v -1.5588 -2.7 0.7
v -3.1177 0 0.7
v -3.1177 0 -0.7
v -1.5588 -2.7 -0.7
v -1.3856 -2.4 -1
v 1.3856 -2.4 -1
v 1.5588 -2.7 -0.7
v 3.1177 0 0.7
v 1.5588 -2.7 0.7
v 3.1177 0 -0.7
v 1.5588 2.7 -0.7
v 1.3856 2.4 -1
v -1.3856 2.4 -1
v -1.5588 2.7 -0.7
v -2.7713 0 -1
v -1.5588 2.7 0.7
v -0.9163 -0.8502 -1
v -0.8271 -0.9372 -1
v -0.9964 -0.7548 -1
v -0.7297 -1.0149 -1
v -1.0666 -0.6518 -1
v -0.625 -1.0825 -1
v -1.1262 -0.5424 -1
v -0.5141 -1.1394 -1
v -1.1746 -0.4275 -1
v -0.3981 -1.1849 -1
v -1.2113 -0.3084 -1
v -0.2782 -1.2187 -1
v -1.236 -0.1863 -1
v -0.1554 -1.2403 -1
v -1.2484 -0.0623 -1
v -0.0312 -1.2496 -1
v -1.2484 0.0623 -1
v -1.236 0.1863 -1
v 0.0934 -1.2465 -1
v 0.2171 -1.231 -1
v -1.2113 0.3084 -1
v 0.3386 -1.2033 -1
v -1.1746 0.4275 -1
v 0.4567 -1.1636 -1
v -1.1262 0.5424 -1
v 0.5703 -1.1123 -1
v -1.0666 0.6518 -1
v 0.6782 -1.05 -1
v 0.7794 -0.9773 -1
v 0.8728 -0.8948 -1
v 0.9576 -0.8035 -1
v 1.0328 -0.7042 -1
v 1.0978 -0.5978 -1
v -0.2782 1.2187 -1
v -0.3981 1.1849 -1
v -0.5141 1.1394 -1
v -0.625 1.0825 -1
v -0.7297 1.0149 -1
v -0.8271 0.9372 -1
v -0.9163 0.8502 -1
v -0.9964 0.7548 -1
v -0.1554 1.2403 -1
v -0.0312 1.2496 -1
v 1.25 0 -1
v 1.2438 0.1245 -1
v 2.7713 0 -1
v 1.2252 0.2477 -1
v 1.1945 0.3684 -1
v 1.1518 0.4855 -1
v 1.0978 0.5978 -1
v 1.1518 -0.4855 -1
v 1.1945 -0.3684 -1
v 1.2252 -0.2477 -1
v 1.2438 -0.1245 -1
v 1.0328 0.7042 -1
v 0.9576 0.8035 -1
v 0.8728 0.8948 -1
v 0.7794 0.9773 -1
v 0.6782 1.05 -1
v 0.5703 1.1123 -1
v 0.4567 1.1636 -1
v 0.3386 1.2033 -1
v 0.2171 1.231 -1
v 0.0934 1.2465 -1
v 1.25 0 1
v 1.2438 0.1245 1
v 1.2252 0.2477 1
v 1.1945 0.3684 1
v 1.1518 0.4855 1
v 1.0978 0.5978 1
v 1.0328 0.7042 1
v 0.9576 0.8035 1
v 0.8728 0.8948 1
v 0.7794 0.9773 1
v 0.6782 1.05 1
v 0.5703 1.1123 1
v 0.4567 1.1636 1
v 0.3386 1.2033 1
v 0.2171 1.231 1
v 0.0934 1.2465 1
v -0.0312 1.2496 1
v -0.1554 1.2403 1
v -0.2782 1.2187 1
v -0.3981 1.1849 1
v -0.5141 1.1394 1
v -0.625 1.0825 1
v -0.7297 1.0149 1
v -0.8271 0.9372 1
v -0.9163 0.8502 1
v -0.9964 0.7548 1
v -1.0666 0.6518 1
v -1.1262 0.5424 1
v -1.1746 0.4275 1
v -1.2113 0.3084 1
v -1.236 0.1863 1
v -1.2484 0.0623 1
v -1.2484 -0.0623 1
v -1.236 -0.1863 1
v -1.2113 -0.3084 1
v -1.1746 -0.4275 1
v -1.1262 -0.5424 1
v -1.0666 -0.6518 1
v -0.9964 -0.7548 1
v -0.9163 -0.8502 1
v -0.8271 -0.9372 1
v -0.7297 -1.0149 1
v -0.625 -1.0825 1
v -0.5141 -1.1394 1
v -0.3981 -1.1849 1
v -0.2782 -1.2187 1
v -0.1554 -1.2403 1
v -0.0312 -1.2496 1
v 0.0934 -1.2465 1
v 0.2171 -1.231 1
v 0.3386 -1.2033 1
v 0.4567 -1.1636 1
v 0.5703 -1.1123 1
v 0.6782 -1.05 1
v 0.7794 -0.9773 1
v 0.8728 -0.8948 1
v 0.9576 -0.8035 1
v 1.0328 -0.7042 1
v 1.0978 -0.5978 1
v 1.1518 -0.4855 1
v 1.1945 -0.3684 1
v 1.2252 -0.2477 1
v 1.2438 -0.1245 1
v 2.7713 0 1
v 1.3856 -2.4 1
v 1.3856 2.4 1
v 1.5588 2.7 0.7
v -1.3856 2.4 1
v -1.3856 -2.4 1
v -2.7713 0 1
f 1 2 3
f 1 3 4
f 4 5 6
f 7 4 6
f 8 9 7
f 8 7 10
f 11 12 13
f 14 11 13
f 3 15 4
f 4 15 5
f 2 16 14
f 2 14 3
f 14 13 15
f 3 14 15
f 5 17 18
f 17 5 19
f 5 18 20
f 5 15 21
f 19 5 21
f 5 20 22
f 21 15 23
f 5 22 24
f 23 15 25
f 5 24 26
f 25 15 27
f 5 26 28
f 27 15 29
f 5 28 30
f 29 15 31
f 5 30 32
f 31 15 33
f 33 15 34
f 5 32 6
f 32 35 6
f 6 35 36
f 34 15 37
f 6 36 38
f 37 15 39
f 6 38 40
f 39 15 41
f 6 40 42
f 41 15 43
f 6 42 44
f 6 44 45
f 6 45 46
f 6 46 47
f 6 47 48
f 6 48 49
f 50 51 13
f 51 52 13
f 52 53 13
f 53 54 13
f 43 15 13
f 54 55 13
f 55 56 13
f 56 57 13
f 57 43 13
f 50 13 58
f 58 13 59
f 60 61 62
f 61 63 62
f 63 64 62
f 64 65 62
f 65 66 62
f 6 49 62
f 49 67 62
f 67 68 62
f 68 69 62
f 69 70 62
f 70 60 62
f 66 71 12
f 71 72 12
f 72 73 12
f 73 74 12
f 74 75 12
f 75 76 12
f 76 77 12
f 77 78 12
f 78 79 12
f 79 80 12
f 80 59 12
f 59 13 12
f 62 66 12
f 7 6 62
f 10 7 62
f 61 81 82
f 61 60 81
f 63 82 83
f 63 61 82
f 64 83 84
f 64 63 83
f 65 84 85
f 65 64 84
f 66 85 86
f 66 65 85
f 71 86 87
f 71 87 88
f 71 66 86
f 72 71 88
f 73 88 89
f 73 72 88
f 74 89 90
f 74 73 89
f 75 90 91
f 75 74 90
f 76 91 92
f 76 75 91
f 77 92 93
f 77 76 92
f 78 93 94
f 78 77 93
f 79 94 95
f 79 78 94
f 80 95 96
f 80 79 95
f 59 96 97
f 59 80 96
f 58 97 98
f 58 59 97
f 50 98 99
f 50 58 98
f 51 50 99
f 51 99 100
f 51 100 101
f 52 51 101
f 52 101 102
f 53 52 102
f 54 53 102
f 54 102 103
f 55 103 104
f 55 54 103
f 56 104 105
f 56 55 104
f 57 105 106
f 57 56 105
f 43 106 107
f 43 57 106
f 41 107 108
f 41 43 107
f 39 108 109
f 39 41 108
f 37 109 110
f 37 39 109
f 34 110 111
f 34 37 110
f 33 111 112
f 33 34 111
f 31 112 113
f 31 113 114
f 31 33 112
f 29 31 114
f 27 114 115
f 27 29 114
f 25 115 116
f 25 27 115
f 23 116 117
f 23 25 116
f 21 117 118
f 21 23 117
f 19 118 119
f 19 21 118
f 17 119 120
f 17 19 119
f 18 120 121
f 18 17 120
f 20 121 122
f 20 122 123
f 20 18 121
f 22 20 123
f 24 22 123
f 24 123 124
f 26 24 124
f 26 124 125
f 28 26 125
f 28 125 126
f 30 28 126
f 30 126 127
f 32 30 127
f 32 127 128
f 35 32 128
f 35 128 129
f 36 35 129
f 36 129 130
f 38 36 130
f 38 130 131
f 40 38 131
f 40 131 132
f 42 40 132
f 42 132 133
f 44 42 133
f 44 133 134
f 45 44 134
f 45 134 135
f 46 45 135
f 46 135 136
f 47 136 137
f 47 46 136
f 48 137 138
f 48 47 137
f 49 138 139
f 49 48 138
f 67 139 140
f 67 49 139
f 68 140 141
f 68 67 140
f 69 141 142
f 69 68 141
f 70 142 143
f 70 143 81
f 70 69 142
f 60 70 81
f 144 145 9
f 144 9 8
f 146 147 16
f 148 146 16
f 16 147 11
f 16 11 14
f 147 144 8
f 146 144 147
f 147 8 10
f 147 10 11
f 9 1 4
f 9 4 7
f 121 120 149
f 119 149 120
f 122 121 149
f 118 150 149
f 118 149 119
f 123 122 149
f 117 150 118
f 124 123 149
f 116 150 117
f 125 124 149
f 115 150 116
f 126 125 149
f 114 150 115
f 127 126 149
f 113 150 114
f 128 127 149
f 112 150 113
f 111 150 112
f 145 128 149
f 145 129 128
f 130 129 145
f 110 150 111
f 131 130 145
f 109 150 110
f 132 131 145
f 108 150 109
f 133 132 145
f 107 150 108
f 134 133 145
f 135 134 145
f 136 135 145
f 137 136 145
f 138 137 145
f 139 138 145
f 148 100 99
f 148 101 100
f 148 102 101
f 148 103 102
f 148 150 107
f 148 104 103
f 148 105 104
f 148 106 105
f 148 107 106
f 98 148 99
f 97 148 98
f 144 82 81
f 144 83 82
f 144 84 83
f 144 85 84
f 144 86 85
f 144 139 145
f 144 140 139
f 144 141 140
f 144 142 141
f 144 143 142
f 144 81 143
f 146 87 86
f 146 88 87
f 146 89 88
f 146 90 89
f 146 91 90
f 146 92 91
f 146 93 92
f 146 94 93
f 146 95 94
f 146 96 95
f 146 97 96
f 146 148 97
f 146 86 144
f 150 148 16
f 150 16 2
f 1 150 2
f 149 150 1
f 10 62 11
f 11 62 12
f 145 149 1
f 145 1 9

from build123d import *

# Parameters (mm, degrees)
SKETCH1_R           = 1.25
BOSS_EXTRUDE1_DEPTH = 1
CHAMFER1_SIZE       = 0.3


with BuildPart() as part:
    # Sketch1 → Boss-Extrude1 (new, symmetric)
    with BuildSketch(Plane.XY):
        Polygon((3.117691454, 0), (1.558845727, 2.7), (-1.558845727, 2.7), (-3.117691454, 0), (-1.558845727, -2.7), (1.558845727, -2.7), align=None)
        Circle(SKETCH1_R, mode=Mode.SUBTRACT)
    extrude(amount=BOSS_EXTRUDE1_DEPTH, both=True)

    # Chamfer1
    chamfer1_edges = [part.edges().sort_by_distance(p)[0] for p in [
        (0, 2.7, 1),
        (-2.33826859, 1.35, 1),
        (-2.33826859, -1.35, 1),
        (0, -2.7, 1),
        (2.33826859, -1.35, 1),
        (0, -2.7, -1),
        (-2.33826859, -1.35, -1),
        (-2.33826859, 1.35, -1),
        (0, 2.7, -1),
        (2.33826859, 1.35, -1),
        (2.33826859, -1.35, -1),
        (2.33826859, 1.35, 1),
    ]]
    chamfer(chamfer1_edges, length=CHAMFER1_SIZE)


solid = part.part
